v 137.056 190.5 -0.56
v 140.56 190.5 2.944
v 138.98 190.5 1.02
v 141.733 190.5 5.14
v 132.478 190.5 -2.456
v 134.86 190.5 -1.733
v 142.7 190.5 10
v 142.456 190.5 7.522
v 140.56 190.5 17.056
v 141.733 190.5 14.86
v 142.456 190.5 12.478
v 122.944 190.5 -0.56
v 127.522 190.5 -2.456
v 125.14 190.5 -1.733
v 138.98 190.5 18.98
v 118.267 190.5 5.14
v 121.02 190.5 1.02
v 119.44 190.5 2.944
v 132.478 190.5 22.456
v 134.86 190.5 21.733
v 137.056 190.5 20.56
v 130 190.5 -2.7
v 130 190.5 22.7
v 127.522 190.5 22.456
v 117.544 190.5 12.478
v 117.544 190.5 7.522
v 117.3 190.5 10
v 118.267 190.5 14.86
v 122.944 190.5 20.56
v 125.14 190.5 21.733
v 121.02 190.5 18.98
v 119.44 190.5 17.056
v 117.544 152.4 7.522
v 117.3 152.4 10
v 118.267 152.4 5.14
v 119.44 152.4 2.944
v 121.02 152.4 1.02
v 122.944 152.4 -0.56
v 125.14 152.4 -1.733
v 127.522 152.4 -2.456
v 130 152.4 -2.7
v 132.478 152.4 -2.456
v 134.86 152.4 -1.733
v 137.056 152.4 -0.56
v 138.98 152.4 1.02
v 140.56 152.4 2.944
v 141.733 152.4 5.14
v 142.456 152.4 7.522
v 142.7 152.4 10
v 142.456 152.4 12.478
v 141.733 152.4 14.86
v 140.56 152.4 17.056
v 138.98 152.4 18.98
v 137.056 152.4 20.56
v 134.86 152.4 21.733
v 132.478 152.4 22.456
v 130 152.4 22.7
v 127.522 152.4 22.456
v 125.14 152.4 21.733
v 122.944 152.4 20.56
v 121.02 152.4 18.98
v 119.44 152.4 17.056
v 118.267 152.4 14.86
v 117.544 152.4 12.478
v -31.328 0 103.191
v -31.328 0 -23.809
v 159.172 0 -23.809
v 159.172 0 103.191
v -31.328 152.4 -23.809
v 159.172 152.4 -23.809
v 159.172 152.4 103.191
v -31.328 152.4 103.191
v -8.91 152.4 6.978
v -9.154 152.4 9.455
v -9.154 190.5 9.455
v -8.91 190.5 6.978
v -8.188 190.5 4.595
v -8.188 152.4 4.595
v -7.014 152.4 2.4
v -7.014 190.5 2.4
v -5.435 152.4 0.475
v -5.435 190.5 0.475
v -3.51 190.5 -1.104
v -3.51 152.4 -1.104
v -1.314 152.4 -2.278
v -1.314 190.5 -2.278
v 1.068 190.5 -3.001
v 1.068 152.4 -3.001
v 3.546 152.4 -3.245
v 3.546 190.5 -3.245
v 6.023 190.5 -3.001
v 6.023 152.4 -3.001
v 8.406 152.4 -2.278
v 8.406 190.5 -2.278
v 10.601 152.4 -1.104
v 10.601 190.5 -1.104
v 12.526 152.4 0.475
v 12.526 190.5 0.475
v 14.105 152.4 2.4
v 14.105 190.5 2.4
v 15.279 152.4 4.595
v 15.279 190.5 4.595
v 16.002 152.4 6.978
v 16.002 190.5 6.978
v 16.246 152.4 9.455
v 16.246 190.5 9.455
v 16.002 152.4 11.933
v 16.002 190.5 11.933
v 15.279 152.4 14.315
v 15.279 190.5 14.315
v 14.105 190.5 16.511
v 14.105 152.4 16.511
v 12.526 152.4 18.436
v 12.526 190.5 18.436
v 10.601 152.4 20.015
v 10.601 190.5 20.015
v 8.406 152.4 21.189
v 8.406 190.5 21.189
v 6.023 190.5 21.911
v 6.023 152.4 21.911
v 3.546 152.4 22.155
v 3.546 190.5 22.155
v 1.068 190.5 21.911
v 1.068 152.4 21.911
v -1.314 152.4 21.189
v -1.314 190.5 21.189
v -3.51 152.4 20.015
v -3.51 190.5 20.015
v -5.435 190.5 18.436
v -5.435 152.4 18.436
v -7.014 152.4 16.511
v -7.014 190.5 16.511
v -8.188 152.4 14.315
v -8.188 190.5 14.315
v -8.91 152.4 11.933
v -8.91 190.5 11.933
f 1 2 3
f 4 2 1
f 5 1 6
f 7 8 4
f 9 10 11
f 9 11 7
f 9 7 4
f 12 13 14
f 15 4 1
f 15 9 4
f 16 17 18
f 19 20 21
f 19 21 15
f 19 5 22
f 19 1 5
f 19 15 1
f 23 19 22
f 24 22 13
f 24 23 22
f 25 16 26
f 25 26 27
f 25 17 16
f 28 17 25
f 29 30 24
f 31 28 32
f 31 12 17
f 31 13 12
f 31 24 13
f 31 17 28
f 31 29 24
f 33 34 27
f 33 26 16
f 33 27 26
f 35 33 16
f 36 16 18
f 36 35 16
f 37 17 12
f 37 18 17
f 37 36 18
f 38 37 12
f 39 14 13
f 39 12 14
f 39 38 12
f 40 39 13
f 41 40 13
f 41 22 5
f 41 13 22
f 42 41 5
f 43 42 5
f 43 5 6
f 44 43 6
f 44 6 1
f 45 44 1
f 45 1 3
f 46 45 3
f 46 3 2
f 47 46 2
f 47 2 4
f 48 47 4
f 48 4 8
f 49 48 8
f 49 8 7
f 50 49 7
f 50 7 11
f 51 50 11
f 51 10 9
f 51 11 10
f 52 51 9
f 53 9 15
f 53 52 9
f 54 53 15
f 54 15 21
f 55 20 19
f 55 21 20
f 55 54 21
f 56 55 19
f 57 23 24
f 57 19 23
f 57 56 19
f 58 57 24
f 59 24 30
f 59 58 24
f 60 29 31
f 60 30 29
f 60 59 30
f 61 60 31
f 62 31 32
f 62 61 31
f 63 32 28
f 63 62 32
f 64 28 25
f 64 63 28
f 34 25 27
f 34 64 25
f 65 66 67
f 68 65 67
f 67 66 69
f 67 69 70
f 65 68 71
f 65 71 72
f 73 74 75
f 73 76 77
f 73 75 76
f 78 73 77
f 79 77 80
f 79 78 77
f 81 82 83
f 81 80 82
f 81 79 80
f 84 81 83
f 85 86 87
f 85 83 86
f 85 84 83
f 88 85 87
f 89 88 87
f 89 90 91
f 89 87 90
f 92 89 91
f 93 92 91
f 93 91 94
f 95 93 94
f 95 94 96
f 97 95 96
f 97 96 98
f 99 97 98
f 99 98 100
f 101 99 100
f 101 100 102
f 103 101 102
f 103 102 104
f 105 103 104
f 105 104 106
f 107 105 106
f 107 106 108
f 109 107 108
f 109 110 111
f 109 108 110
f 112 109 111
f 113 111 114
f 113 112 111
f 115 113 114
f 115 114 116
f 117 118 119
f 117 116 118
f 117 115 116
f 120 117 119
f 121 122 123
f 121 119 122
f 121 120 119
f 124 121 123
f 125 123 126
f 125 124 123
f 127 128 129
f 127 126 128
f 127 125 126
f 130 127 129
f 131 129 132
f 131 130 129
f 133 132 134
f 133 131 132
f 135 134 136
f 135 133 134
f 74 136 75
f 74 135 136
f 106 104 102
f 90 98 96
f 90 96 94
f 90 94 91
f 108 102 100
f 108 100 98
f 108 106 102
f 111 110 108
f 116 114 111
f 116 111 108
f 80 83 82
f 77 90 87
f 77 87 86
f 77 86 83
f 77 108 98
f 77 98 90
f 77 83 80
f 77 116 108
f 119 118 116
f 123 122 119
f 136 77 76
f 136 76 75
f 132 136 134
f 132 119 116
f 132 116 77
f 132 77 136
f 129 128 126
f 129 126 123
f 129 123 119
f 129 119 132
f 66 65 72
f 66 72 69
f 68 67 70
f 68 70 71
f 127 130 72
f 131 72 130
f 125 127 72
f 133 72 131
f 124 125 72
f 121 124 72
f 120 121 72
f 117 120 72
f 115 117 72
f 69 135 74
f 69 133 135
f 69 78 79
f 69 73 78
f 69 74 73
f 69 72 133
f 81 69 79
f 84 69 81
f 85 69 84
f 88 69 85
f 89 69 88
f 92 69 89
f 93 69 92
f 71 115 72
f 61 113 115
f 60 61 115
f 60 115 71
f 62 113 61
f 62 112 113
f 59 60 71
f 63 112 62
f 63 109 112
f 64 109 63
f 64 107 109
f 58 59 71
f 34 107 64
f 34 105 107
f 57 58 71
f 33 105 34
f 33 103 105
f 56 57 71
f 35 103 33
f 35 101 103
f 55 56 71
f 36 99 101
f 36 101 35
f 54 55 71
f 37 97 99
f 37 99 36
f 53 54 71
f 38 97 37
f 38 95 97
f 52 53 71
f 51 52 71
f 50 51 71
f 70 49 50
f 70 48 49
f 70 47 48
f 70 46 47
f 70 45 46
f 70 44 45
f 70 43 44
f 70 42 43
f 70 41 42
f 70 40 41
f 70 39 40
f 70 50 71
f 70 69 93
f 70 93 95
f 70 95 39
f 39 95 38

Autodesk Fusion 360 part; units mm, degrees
sketch "Sketch1" plane through (0, 0, 0) normal (0, 1, 0) x (1, 0, 0)
  line L0 (-31.3279, 23.8092) -> (159.1721, 23.8092)
  line L1 (159.1721, 23.8092) -> (159.1721, -103.1908)
  line L2 (159.1721, -103.1908) -> (-31.3279, -103.1908)
  line L3 (-31.3279, -103.1908) -> (-31.3279, 23.8092)
  dimension "d1" = 190.5
  dimension "d2" = 127
extrude "Extrude1" add sketch "Sketch1" along normal blind 152.4
sketch "Sketch2" plane through (0, 152.4, 0) normal (0, 1, 0) x (-1, 0, 0)
  line L0 (31.3279, 103.1908) -> (-159.1721, 103.1908)
  line L1 (-159.1721, 103.1908) -> (-159.1721, -23.8092)
  line L2 (-159.1721, -23.8092) -> (31.3279, -23.8092)
  line L3 (31.3279, -23.8092) -> (31.3279, 103.1908)
  circle A0 centre (-3.5457, 9.4553) radius 12.7
  circle A1 centre (-130, 10) radius 12.7
  dimension "d5" = 25.4
  dimension "d6" = 25.4
extrude "Extrude2" add sketch "Sketch2" along normal blind 38.1 contours A0
extrude "Extrude3" add sketch "Sketch2" along normal blind 38.1 contours A1
